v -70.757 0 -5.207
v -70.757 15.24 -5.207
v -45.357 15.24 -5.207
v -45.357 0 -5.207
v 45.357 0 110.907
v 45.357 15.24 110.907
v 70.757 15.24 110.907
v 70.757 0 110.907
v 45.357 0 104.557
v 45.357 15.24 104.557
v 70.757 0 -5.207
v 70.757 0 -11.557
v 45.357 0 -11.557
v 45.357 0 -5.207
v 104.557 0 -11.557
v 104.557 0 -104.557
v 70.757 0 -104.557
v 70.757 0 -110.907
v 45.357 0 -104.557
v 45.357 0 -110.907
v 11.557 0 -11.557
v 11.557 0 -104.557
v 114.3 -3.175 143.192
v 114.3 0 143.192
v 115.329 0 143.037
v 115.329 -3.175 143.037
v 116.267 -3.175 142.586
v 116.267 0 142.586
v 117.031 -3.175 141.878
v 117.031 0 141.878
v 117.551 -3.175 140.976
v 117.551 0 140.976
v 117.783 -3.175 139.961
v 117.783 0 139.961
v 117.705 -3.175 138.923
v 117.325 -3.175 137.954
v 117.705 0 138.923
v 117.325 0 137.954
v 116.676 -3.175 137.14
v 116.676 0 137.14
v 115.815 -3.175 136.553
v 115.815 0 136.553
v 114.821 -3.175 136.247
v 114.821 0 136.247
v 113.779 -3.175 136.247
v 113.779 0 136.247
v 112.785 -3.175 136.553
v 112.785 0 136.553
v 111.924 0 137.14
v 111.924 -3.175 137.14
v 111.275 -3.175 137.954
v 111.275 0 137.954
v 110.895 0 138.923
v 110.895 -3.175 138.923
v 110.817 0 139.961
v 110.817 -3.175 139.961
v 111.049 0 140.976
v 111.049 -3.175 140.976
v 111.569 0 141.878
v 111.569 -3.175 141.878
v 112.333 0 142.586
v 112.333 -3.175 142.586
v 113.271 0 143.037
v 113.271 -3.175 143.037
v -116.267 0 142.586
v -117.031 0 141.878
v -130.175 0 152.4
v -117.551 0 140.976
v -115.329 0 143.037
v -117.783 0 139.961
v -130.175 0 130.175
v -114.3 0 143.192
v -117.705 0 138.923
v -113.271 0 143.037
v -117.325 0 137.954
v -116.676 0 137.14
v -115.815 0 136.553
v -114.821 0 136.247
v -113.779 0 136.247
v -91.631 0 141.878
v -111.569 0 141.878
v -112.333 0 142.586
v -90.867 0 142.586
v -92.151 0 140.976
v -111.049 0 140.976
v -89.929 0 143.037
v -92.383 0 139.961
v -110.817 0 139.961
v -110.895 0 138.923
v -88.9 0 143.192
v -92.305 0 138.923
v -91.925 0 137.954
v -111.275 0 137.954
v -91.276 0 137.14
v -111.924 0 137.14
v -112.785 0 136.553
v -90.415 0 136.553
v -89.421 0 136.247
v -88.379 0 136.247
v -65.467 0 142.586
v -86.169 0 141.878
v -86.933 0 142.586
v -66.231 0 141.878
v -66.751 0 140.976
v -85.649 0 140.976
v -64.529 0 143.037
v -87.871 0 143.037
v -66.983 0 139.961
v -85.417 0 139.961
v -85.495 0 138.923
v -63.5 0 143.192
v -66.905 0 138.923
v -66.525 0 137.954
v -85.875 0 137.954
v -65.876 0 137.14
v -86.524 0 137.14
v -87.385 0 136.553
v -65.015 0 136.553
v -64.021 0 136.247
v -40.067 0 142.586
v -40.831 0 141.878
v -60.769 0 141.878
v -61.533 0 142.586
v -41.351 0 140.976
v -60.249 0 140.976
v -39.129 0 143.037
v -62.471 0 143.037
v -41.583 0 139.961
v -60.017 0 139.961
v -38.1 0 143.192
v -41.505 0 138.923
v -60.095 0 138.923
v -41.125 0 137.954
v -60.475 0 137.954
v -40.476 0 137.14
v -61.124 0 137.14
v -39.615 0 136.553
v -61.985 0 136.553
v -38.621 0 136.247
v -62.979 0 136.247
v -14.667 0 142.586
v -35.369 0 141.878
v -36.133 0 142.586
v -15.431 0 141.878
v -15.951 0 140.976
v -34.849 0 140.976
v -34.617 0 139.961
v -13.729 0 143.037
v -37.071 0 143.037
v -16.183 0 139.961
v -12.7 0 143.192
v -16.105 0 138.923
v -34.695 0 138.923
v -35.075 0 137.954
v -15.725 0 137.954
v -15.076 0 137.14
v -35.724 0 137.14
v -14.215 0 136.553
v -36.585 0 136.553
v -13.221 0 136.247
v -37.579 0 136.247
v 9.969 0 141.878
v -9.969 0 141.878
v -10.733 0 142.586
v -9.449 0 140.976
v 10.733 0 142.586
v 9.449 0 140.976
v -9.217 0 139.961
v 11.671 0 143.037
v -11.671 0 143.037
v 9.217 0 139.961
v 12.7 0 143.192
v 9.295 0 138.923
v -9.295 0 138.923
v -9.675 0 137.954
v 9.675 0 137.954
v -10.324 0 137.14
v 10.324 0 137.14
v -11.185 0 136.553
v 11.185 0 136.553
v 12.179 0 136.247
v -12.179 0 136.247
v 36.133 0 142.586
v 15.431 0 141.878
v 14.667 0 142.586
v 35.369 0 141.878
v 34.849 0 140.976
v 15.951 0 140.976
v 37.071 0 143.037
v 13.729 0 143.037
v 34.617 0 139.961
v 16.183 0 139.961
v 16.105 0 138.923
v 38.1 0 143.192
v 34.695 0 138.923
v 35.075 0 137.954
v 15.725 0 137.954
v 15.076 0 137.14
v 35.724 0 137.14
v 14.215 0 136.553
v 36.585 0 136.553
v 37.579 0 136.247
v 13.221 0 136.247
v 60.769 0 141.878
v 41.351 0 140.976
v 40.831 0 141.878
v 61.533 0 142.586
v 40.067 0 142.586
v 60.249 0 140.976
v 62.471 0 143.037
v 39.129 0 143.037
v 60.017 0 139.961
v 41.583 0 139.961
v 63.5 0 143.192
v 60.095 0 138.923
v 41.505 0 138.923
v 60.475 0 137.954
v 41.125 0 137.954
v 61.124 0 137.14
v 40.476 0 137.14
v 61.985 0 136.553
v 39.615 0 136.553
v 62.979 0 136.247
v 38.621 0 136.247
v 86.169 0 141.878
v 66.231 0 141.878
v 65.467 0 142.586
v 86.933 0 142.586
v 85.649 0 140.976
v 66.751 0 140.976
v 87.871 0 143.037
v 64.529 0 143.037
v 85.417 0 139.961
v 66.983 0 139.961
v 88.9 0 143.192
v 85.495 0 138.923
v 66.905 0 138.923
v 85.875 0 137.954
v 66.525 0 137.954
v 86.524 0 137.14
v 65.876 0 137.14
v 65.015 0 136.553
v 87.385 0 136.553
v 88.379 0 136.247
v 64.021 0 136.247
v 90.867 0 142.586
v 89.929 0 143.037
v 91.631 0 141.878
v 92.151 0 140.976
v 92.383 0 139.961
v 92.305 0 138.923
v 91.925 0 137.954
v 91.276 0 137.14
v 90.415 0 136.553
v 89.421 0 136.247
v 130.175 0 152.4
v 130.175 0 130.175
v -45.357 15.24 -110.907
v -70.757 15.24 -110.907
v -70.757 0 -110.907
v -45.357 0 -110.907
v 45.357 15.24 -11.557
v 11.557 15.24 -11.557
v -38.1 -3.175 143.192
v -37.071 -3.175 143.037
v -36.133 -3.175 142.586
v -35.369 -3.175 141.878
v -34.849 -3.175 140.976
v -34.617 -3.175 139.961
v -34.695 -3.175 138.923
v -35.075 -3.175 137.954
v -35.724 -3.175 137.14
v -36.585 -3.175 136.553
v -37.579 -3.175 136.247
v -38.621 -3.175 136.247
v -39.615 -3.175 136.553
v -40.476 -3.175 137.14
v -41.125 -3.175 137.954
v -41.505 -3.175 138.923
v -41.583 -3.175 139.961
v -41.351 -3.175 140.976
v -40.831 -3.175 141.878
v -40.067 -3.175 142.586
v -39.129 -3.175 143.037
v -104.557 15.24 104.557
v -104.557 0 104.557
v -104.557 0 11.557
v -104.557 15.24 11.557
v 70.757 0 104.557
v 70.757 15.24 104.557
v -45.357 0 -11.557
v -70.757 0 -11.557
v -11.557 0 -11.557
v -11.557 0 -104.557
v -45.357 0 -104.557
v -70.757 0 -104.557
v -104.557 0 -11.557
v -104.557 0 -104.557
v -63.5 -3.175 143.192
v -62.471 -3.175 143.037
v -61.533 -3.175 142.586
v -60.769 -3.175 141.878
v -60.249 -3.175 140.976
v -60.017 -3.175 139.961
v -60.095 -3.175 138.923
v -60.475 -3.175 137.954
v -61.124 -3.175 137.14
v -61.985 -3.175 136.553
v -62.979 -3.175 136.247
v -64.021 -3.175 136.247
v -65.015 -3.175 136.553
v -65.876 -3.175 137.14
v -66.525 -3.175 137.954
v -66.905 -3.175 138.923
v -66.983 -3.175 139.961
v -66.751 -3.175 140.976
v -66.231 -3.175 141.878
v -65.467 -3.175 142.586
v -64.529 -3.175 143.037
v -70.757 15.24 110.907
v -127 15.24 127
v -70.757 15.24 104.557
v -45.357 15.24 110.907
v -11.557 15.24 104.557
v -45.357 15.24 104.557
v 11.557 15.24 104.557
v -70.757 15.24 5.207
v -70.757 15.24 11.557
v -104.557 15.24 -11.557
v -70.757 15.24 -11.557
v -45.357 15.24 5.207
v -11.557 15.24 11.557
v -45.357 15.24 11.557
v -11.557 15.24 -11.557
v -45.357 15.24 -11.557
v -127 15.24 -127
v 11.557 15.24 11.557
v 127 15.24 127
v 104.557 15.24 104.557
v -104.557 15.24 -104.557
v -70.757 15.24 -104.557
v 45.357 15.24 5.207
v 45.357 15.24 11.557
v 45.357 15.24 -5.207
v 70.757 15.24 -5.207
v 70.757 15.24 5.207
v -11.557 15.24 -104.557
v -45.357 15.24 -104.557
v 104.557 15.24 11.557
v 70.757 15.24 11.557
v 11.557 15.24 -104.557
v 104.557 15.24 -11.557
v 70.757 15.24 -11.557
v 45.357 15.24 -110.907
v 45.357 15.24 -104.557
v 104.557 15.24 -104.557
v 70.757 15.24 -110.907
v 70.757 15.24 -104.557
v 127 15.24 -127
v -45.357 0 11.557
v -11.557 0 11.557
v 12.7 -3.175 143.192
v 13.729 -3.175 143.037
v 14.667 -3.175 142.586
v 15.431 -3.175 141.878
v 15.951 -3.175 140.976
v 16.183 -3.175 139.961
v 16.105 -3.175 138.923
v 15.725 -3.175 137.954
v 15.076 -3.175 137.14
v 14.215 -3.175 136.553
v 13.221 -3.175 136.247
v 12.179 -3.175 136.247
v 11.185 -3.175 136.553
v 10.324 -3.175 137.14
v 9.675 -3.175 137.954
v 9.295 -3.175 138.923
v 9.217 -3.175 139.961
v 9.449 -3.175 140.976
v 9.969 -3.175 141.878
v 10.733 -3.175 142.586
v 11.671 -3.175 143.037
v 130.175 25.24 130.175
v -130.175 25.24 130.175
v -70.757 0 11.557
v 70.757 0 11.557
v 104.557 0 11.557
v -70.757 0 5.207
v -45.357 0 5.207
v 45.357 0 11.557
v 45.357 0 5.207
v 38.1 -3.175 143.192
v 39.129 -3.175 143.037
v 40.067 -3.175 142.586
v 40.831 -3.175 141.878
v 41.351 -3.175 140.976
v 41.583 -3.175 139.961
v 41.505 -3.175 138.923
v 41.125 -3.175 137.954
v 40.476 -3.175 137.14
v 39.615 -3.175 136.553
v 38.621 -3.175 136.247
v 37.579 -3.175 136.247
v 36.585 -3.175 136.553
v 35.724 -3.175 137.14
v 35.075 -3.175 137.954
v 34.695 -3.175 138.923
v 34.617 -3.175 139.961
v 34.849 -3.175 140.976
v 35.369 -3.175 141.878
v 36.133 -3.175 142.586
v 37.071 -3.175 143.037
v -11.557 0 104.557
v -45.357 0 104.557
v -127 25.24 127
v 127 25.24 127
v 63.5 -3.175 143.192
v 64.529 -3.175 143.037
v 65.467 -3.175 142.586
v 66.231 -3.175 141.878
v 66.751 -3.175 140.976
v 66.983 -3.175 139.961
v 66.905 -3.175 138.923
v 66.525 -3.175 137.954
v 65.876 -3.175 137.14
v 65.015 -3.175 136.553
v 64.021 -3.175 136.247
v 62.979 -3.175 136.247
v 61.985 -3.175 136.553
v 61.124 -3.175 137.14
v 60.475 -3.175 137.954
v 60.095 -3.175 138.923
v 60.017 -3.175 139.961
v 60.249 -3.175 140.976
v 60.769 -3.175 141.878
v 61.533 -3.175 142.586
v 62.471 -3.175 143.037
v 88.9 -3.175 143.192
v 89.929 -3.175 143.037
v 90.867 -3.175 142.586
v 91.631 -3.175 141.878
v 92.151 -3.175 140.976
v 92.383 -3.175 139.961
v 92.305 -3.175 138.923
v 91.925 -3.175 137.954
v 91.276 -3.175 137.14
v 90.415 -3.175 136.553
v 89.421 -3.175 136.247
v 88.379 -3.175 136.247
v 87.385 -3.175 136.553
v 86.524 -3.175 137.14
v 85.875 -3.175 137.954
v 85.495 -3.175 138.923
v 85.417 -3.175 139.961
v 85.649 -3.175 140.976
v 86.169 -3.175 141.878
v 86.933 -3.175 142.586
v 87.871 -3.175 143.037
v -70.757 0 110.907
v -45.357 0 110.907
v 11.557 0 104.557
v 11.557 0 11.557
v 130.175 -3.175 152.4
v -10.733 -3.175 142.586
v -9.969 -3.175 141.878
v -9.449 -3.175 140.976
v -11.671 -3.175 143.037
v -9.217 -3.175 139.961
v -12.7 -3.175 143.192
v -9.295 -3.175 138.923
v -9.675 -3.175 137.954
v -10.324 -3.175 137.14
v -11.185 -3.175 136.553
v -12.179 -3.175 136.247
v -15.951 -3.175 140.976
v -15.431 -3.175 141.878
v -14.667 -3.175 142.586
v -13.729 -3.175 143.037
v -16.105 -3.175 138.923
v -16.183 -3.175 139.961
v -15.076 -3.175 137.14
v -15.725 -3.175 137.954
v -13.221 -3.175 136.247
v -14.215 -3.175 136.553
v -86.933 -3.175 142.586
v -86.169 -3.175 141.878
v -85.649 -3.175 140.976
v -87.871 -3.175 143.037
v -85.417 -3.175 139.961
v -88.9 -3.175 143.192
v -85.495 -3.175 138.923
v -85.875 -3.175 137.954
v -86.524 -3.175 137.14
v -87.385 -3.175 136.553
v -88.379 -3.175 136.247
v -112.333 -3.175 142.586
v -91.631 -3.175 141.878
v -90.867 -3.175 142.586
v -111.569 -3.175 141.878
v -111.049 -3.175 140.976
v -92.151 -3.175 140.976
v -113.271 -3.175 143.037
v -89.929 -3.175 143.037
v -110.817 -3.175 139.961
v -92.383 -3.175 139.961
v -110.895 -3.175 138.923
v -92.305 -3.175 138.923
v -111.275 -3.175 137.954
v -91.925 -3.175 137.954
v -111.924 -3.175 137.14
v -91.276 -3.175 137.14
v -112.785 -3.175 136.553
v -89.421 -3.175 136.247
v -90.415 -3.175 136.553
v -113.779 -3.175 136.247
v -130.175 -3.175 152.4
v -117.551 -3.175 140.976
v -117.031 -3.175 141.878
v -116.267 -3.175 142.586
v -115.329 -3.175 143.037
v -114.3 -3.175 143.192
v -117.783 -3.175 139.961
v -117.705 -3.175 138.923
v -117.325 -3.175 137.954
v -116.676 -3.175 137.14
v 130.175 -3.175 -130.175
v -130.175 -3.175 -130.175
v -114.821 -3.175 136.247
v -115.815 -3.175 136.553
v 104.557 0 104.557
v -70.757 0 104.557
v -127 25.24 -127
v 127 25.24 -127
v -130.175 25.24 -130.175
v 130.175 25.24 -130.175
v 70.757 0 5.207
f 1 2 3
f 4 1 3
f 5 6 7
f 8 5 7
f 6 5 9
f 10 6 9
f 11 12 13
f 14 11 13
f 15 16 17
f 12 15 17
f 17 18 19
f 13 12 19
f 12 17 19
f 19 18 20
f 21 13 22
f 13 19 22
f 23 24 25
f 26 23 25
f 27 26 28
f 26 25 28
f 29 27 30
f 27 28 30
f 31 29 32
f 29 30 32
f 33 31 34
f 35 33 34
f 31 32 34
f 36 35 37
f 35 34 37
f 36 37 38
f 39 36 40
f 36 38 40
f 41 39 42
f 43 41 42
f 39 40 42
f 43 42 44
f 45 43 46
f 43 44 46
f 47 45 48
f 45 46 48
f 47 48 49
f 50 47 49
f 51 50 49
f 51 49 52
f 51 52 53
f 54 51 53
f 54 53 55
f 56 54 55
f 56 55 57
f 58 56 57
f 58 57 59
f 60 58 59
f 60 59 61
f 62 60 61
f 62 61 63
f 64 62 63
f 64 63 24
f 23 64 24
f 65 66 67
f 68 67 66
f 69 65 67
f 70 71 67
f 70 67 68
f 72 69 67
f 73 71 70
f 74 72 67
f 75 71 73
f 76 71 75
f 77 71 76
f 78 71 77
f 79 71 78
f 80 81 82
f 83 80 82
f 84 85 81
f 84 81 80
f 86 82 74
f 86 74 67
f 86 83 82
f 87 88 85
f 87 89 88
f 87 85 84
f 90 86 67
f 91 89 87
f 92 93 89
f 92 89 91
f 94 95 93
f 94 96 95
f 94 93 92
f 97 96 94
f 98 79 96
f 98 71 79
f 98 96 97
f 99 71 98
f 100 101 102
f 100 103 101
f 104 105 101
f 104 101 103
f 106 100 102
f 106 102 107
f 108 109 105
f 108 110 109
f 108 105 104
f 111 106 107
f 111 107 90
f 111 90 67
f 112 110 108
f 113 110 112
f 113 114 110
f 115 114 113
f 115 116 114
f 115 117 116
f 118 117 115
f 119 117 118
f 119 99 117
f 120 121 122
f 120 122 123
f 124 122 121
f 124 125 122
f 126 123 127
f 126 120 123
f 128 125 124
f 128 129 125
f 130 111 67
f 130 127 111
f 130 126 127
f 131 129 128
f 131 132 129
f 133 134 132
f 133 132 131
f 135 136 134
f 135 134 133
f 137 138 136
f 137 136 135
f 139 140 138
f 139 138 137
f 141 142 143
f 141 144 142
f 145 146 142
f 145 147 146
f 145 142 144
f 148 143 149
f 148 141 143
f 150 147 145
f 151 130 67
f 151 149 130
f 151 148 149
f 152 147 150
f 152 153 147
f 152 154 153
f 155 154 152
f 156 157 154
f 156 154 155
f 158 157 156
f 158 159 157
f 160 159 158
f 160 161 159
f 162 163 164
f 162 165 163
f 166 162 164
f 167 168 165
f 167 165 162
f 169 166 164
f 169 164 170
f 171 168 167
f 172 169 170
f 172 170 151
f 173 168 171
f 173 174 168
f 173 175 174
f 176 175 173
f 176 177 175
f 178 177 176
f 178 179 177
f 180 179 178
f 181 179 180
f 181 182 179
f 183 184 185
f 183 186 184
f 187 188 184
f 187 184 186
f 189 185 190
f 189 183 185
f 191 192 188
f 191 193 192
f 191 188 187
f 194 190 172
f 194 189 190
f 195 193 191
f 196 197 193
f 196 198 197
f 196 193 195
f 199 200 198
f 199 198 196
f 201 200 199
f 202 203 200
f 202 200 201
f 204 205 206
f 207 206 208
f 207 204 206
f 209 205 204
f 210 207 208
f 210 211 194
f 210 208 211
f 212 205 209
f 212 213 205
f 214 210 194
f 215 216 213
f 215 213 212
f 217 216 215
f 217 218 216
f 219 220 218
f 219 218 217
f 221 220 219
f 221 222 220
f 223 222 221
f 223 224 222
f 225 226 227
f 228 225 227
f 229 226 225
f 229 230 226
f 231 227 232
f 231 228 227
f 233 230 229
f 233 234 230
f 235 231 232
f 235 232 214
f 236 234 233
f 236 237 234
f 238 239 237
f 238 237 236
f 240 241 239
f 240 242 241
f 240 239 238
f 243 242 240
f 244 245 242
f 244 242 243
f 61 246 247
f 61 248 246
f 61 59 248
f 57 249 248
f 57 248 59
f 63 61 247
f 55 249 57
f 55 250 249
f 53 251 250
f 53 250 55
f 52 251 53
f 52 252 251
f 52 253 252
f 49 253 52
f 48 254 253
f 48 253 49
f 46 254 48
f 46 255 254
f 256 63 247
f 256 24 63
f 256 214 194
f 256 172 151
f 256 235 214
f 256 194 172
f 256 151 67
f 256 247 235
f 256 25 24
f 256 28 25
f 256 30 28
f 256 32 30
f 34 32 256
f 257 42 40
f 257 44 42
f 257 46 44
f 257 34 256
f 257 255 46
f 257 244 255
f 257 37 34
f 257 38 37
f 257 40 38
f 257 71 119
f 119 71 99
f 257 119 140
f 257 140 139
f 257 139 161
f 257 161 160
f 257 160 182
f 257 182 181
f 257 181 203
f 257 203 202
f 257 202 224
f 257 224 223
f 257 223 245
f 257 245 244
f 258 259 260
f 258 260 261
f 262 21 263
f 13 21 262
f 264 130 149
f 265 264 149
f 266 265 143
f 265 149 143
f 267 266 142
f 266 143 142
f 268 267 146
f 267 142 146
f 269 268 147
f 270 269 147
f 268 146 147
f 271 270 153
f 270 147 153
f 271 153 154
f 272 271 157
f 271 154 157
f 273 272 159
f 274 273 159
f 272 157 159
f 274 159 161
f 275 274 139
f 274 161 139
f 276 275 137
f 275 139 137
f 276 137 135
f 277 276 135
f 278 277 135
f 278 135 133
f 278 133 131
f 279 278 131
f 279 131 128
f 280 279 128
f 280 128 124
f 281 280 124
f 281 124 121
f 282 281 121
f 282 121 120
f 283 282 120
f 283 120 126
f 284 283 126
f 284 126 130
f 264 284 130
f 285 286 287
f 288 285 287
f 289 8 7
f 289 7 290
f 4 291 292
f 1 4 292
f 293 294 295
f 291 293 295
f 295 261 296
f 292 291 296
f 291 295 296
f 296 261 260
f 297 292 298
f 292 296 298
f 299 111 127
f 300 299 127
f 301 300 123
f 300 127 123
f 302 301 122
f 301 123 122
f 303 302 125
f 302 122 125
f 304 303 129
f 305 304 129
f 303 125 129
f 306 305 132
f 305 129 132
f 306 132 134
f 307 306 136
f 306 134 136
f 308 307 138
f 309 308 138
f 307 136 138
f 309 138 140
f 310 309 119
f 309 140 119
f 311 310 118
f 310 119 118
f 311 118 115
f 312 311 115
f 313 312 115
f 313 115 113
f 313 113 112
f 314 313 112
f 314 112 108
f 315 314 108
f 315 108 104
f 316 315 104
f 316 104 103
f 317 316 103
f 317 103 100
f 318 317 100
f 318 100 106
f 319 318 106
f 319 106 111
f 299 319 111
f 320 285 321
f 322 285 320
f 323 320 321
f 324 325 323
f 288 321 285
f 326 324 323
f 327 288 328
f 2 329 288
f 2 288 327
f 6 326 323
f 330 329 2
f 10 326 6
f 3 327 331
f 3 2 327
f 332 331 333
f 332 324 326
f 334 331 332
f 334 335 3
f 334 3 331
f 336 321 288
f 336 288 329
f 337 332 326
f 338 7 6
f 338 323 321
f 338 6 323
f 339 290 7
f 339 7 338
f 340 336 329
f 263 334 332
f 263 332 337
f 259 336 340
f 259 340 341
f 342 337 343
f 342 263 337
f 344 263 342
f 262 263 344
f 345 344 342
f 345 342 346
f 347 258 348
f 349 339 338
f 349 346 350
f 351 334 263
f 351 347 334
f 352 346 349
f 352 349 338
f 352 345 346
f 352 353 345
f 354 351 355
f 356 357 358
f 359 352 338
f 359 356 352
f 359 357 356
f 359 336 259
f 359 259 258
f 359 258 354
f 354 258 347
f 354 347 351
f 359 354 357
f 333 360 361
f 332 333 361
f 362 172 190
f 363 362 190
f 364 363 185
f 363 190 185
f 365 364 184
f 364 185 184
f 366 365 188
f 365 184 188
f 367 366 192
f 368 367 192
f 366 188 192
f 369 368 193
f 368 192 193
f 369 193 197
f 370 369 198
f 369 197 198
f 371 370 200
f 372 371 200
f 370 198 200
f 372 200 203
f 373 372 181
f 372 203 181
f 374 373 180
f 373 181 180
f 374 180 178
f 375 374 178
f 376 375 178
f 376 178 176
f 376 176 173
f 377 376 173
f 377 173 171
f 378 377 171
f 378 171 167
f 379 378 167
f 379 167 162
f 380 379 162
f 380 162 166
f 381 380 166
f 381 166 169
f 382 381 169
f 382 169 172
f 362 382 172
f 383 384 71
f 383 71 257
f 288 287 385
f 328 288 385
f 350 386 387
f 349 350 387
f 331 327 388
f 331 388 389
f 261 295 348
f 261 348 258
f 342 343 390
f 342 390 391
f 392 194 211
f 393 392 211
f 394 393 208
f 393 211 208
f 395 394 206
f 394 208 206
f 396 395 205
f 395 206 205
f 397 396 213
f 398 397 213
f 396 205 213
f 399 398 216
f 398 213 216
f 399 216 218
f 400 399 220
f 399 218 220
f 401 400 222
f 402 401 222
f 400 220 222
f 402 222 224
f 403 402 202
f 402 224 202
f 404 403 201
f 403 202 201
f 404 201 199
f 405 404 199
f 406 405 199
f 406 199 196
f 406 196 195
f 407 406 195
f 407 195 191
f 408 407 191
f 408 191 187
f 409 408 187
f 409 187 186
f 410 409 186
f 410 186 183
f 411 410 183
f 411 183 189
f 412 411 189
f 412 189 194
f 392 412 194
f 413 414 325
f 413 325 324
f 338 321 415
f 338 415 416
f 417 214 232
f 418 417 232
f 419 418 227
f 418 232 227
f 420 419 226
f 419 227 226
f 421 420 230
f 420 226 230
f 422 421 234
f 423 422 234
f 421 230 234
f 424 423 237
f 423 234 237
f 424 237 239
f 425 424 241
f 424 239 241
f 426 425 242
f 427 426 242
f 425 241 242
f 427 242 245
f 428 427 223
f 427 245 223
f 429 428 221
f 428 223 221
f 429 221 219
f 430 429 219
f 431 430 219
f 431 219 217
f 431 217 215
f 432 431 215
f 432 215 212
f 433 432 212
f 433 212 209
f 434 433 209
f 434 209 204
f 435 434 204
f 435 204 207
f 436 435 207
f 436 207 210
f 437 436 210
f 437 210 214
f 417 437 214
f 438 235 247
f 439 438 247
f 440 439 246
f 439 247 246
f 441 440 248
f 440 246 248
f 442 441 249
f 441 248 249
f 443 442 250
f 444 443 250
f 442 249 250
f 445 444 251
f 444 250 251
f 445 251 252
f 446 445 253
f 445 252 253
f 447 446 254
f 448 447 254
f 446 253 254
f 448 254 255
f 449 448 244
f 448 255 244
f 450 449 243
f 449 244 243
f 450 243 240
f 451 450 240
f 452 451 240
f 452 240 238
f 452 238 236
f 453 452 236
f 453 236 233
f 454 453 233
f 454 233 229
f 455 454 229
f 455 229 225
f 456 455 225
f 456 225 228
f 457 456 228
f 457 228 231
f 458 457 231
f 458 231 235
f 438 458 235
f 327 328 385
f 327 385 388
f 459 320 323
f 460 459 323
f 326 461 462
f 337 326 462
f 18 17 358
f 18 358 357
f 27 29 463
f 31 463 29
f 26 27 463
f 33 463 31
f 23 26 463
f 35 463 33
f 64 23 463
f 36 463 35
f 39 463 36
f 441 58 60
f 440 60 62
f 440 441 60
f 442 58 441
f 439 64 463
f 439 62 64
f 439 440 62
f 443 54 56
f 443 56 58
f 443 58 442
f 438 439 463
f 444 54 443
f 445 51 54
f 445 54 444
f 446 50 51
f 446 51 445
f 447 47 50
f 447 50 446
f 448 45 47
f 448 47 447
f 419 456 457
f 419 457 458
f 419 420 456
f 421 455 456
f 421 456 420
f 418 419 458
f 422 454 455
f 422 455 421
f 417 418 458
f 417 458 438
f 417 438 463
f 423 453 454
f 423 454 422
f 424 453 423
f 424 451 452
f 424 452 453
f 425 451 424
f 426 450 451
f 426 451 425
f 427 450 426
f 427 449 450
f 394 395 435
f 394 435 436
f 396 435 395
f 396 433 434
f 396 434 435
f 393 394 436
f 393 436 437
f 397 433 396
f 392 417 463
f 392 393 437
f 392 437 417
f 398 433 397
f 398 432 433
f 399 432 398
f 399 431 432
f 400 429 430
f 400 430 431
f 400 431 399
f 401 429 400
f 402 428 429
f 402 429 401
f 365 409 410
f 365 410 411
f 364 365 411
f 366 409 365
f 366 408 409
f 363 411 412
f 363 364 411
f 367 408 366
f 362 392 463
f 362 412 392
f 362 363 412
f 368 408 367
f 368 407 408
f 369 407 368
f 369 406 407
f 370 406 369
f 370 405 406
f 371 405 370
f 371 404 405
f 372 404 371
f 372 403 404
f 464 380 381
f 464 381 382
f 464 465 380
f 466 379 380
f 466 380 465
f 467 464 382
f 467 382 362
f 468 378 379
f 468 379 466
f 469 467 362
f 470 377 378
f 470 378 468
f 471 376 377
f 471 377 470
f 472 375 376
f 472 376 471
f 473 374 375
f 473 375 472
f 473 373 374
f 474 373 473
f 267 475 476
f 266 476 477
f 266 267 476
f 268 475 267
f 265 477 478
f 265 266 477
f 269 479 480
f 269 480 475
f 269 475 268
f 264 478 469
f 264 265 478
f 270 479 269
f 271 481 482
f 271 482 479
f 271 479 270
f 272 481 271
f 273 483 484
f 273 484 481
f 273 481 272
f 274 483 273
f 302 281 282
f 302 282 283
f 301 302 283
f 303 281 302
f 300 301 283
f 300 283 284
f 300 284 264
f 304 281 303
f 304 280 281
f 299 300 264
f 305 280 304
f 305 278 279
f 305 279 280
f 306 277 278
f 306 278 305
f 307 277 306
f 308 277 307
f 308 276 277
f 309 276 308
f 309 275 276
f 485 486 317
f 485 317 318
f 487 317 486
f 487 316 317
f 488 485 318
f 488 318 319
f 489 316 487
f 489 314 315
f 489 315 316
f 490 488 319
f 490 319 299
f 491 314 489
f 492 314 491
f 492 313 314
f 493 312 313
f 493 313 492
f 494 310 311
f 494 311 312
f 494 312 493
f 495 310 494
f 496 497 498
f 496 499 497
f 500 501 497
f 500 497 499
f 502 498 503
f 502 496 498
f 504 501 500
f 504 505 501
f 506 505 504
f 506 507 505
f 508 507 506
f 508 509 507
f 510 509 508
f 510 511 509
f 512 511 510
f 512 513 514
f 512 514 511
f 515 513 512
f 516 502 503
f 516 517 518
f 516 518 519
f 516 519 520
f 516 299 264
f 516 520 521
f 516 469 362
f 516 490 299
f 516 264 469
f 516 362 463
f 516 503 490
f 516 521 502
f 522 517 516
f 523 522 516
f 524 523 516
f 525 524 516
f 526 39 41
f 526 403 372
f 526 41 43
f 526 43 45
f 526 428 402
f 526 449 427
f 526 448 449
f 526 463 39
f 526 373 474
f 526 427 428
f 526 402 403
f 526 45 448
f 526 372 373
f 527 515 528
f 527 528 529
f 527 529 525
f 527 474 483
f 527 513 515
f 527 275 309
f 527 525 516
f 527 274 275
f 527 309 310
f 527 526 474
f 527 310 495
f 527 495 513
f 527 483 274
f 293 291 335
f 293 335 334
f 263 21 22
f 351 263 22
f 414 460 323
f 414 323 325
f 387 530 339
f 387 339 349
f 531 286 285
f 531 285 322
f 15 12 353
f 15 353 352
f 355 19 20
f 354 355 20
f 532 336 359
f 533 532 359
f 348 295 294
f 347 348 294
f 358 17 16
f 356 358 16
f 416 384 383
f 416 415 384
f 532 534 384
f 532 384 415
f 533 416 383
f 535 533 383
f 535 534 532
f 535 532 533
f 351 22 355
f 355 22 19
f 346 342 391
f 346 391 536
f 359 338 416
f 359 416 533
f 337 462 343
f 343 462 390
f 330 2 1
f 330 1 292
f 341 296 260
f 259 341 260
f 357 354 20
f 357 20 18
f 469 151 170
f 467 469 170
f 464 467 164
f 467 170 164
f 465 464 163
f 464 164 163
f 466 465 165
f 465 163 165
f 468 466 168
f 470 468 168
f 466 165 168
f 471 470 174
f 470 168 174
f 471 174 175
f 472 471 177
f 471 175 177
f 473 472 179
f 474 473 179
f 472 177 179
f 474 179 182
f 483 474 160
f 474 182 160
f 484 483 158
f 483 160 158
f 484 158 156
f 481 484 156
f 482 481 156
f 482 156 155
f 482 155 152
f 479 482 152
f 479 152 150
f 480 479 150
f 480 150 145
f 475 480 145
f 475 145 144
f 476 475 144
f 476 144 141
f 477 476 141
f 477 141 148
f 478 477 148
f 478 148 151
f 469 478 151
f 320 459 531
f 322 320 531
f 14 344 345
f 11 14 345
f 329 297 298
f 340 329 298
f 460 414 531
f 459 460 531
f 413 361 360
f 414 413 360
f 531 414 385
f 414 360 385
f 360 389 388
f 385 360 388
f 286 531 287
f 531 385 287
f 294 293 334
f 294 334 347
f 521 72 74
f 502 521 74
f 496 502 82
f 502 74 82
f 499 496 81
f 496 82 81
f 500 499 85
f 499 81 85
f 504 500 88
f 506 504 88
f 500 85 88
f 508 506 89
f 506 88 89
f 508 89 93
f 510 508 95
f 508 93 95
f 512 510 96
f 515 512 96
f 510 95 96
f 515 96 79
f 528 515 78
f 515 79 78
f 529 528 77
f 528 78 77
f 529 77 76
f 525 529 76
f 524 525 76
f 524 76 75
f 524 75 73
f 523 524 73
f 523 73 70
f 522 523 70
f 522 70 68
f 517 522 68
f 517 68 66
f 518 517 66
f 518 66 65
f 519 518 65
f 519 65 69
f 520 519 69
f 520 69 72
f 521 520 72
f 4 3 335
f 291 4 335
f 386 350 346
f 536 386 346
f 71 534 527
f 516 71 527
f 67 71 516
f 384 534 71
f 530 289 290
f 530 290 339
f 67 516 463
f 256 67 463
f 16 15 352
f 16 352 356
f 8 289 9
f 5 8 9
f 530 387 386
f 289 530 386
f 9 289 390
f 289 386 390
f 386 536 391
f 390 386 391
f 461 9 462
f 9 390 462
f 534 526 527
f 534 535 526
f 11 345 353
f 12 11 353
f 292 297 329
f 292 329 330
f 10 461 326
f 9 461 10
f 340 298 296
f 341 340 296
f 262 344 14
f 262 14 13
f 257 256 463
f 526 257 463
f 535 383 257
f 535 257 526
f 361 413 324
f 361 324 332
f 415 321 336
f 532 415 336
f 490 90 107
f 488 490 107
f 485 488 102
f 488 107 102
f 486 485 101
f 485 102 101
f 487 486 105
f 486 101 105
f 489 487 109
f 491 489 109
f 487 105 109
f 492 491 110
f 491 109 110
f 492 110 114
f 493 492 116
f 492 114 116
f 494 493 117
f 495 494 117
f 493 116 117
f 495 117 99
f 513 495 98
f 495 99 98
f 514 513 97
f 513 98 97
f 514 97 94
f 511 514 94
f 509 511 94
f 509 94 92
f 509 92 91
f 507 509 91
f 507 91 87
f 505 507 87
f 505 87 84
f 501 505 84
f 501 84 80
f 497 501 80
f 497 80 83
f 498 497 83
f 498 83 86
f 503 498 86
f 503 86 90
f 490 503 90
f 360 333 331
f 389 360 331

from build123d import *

# Parameters (mm, degrees)
SKETCH1_W           = 304.8
SKETCH1_H           = 304.8
SKETCH1_W_2         = 93
SKETCH1_H_2         = 93
BOSS_EXTRUDE1_DEPTH = 15.24
SKETCH2_W           = 304.8
SKETCH2_H           = 304.8
BOSS_EXTRUDE2_DEPTH = 3.175
SKETCH3_W           = 304.8
SKETCH3_H           = 304.8
SKETCH3_W_2         = 254
SKETCH3_H_2         = 254
BOSS_EXTRUDE3_DEPTH = 10
SKETCH4_OUTSIDE_W   = 393.198
SKETCH4_OUTSIDE_H   = 393.198
SKETCH4_OUTSIDE_W_2 = 260.35
SKETCH4_OUTSIDE_H_2 = 260.35
CUT_EXTRUDE1_DEPTH  = 25.24
SKETCH5_R           = 3.4925
CUT_EXTRUDE2_DEPTH  = 217.999026726
SKETCH6_W           = 25.4
SKETCH6_H           = 6.35
CUT_EXTRUDE3_DEPTH  = 15.24
SKETCH7_W           = 388.208697242
SKETCH7_H           = 185.968986832
CUT_EXTRUDE4_DEPTH  = 323.042618647
SKETCH8_W           = 545.051384684
SKETCH8_H           = 463.265958
CUT_EXTRUDE5_DEPTH  = 323.042618647
SKETCH9_W           = 585.539242267
SKETCH9_H           = 383.639310532
CUT_EXTRUDE6_DEPTH  = 303.729153039


with BuildPart() as part:
    # Sketch1 → Boss-Extrude1 (new body)
    with BuildSketch(Plane(origin=(0, 0, 0), x_dir=(1, 0, 0), z_dir=(0, 1, 0))):
        Rectangle(SKETCH1_W, SKETCH1_H)
        with Locations((58.057, 58.057)):
            Rectangle(SKETCH1_W_2, SKETCH1_H_2, mode=Mode.SUBTRACT)
        with Locations((-58.057, 58.057)):
            Rectangle(SKETCH1_W_2, SKETCH1_H_2, mode=Mode.SUBTRACT)
        with Locations((-58.057, -58.057)):
            Rectangle(SKETCH1_W_2, SKETCH1_H_2, mode=Mode.SUBTRACT)
        with Locations((58.057, -58.057)):
            Rectangle(SKETCH1_W_2, SKETCH1_H_2, mode=Mode.SUBTRACT)
    extrude(amount=BOSS_EXTRUDE1_DEPTH)

    # Sketch2 → Boss-Extrude2 (add)
    with BuildSketch(Plane(origin=(0, 0, 0), x_dir=(-1, 0, 0), z_dir=(0, -1, 0))):
        Rectangle(SKETCH2_W, SKETCH2_H)
    extrude(amount=BOSS_EXTRUDE2_DEPTH)

    # Sketch3 → Boss-Extrude3 (add)
    with BuildSketch(Plane(origin=(0, 15.24, 0), x_dir=(1, 0, 0), z_dir=(0, 1, 0))):
        Rectangle(SKETCH3_W, SKETCH3_H)
        Rectangle(SKETCH3_W_2, SKETCH3_H_2, mode=Mode.SUBTRACT)
    extrude(amount=BOSS_EXTRUDE3_DEPTH)

    # Sketch4 outside → Cut-Extrude1 (cut)
    with BuildSketch(Plane(origin=(0, 25.24, 0), x_dir=(1, 0, 0), z_dir=(0, 1, 0))):
        Rectangle(SKETCH4_OUTSIDE_W, SKETCH4_OUTSIDE_H)
        Rectangle(SKETCH4_OUTSIDE_W_2, SKETCH4_OUTSIDE_H_2, mode=Mode.SUBTRACT)
    extrude(amount=-CUT_EXTRUDE1_DEPTH, mode=Mode.SUBTRACT)

    # Sketch5 → Cut-Extrude2 (cut, through all)
    with BuildSketch(Plane(origin=(0, 0, 0), x_dir=(1, 0, 0), z_dir=(0, 1, 0))):
        with Locations(Location((-139.7, -139.7, 0), (0, 0, 270))):
            Circle(SKETCH5_R)
        with Locations(Location((-114.3, -139.7, 0), (0, 0, 270))):
            Circle(SKETCH5_R)
        with Locations(Location((-88.9, -139.7, 0), (0, 0, 270))):
            Circle(SKETCH5_R)
        with Locations(Location((-63.5, -139.7, 0), (0, 0, 270))):
            Circle(SKETCH5_R)
        with Locations(Location((-38.1, -139.7, 0), (0, 0, 270))):
            Circle(SKETCH5_R)
        with Locations(Location((-12.7, -139.7, 0), (0, 0, 270))):
            Circle(SKETCH5_R)
        with Locations(Location((12.7, -139.7, 0), (0, 0, 270))):
            Circle(SKETCH5_R)
        with Locations(Location((38.1, -139.7, 0), (0, 0, 270))):
            Circle(SKETCH5_R)
        with Locations(Location((63.5, -139.7, 0), (0, 0, 270))):
            Circle(SKETCH5_R)
        with Locations(Location((88.9, -139.7, 0), (0, 0, 270))):
            Circle(SKETCH5_R)
        with Locations(Location((114.3, -139.7, 0), (0, 0, 270))):
            Circle(SKETCH5_R)
        with Locations(Location((139.7, -139.7, 0), (0, 0, 270))):
            Circle(SKETCH5_R)
        with Locations(Location((-139.7, -114.3, 0), (0, 0, 270))):
            Circle(SKETCH5_R)
        with Locations(Location((-139.7, -88.9, 0), (0, 0, 270))):
            Circle(SKETCH5_R)
        with Locations(Location((-139.7, -63.5, 0), (0, 0, 270))):
            Circle(SKETCH5_R)
        with Locations(Location((-139.7, -38.1, 0), (0, 0, 270))):
            Circle(SKETCH5_R)
        with Locations(Location((-139.7, -12.7, 0), (0, 0, 270))):
            Circle(SKETCH5_R)
        with Locations(Location((-139.7, 12.7, 0), (0, 0, 270))):
            Circle(SKETCH5_R)
        with Locations(Location((-139.7, 38.1, 0), (0, 0, 270))):
            Circle(SKETCH5_R)
        with Locations(Location((-139.7, 63.5, 0), (0, 0, 270))):
            Circle(SKETCH5_R)
        with Locations(Location((-139.7, 88.9, 0), (0, 0, 270))):
            Circle(SKETCH5_R)
        with Locations(Location((-139.7, 114.3, 0), (0, 0, 270))):
            Circle(SKETCH5_R)
        with Locations(Location((-139.7, 139.7, 0), (0, 0, 270))):
            Circle(SKETCH5_R)
        with Locations(Location((-114.3, 139.7, 0), (0, 0, 270))):
            Circle(SKETCH5_R)
        with Locations(Location((-88.9, 139.7, 0), (0, 0, 270))):
            Circle(SKETCH5_R)
        with Locations(Location((-63.5, 139.7, 0), (0, 0, 270))):
            Circle(SKETCH5_R)
        with Locations(Location((-38.1, 139.7, 0), (0, 0, 270))):
            Circle(SKETCH5_R)
        with Locations(Location((-12.7, 139.7, 0), (0, 0, 270))):
            Circle(SKETCH5_R)
        with Locations(Location((12.7, 139.7, 0), (0, 0, 270))):
            Circle(SKETCH5_R)
        with Locations(Location((38.1, 139.7, 0), (0, 0, 270))):
            Circle(SKETCH5_R)
        with Locations(Location((63.5, 139.7, 0), (0, 0, 270))):
            Circle(SKETCH5_R)
        with Locations(Location((88.9, 139.7, 0), (0, 0, 270))):
            Circle(SKETCH5_R)
        with Locations(Location((114.3, 139.7, 0), (0, 0, 270))):
            Circle(SKETCH5_R)
        with Locations(Location((139.7, 139.7, 0), (0, 0, 270))):
            Circle(SKETCH5_R)
        with Locations(Location((139.7, 114.3, 0), (0, 0, 270))):
            Circle(SKETCH5_R)
        with Locations(Location((139.7, 88.9, 0), (0, 0, 270))):
            Circle(SKETCH5_R)
        with Locations(Location((139.7, 63.5, 0), (0, 0, 270))):
            Circle(SKETCH5_R)
        with Locations(Location((139.7, 38.1, 0), (0, 0, 270))):
            Circle(SKETCH5_R)
        with Locations(Location((139.7, 12.7, 0), (0, 0, 270))):
            Circle(SKETCH5_R)
        with Locations(Location((139.7, -12.7, 0), (0, 0, 270))):
            Circle(SKETCH5_R)
        with Locations(Location((139.7, -38.1, 0), (0, 0, 270))):
            Circle(SKETCH5_R)
        with Locations(Location((139.7, -63.5, 0), (0, 0, 270))):
            Circle(SKETCH5_R)
        with Locations(Location((139.7, -88.9, 0), (0, 0, 270))):
            Circle(SKETCH5_R)
        with Locations(Location((139.7, -114.3, 0), (0, 0, 270))):
            Circle(SKETCH5_R)
    extrude(amount=-CUT_EXTRUDE2_DEPTH, mode=Mode.SUBTRACT)

    # Sketch6 → Cut-Extrude3 (cut)
    with BuildSketch(Plane(origin=(0, 15.24, 0), x_dir=(1, 0, 0), z_dir=(0, 1, 0))):
        with Locations((-58.057, 107.732)):
            Rectangle(SKETCH6_W, SKETCH6_H)
        with Locations((-58.057, -8.382)):
            Rectangle(SKETCH6_W, SKETCH6_H)
        with Locations((-58.057, 8.382)):
            Rectangle(SKETCH6_W, SKETCH6_H)
        with Locations((-58.057, -107.732)):
            Rectangle(SKETCH6_W, SKETCH6_H)
        with Locations((58.057, -107.732)):
            Rectangle(SKETCH6_W, SKETCH6_H)
        with Locations((58.057, -8.382)):
            Rectangle(SKETCH6_W, SKETCH6_H)
        with Locations((58.057, 8.382)):
            Rectangle(SKETCH6_W, SKETCH6_H)
        with Locations((58.057, 107.732)):
            Rectangle(SKETCH6_W, SKETCH6_H)
    extrude(amount=-CUT_EXTRUDE3_DEPTH, mode=Mode.SUBTRACT)

    # Sketch7 → Cut-Extrude4 (cut, through all)
    with BuildSketch(Plane(origin=(0, 0, -130.175), x_dir=(-1, 0, 0), z_dir=(0, 0, -1))):
        with Locations((-26.237813245, -25.540582214)):
            Rectangle(SKETCH7_W, SKETCH7_H)
    extrude(amount=CUT_EXTRUDE4_DEPTH, mode=Mode.SUBTRACT)

    # Sketch8 → Cut-Extrude5 (cut, through all)
    with BuildSketch(Plane.ZY.offset(130.175)):
        with Locations((35.238029092, 25.908608745)):
            Rectangle(SKETCH8_W, SKETCH8_H)
    extrude(amount=CUT_EXTRUDE5_DEPTH, mode=Mode.SUBTRACT)

    # Sketch9 → Cut-Extrude6 (cut, through all)
    with BuildSketch(Plane(origin=(130.175, 0, 0), x_dir=(0, 0, -1), z_dir=(1, 0, 0))):
        with Locations((26.844145207, 44.758305083)):
            Rectangle(SKETCH9_W, SKETCH9_H)
    extrude(amount=CUT_EXTRUDE6_DEPTH, mode=Mode.SUBTRACT)


solid = part.part
